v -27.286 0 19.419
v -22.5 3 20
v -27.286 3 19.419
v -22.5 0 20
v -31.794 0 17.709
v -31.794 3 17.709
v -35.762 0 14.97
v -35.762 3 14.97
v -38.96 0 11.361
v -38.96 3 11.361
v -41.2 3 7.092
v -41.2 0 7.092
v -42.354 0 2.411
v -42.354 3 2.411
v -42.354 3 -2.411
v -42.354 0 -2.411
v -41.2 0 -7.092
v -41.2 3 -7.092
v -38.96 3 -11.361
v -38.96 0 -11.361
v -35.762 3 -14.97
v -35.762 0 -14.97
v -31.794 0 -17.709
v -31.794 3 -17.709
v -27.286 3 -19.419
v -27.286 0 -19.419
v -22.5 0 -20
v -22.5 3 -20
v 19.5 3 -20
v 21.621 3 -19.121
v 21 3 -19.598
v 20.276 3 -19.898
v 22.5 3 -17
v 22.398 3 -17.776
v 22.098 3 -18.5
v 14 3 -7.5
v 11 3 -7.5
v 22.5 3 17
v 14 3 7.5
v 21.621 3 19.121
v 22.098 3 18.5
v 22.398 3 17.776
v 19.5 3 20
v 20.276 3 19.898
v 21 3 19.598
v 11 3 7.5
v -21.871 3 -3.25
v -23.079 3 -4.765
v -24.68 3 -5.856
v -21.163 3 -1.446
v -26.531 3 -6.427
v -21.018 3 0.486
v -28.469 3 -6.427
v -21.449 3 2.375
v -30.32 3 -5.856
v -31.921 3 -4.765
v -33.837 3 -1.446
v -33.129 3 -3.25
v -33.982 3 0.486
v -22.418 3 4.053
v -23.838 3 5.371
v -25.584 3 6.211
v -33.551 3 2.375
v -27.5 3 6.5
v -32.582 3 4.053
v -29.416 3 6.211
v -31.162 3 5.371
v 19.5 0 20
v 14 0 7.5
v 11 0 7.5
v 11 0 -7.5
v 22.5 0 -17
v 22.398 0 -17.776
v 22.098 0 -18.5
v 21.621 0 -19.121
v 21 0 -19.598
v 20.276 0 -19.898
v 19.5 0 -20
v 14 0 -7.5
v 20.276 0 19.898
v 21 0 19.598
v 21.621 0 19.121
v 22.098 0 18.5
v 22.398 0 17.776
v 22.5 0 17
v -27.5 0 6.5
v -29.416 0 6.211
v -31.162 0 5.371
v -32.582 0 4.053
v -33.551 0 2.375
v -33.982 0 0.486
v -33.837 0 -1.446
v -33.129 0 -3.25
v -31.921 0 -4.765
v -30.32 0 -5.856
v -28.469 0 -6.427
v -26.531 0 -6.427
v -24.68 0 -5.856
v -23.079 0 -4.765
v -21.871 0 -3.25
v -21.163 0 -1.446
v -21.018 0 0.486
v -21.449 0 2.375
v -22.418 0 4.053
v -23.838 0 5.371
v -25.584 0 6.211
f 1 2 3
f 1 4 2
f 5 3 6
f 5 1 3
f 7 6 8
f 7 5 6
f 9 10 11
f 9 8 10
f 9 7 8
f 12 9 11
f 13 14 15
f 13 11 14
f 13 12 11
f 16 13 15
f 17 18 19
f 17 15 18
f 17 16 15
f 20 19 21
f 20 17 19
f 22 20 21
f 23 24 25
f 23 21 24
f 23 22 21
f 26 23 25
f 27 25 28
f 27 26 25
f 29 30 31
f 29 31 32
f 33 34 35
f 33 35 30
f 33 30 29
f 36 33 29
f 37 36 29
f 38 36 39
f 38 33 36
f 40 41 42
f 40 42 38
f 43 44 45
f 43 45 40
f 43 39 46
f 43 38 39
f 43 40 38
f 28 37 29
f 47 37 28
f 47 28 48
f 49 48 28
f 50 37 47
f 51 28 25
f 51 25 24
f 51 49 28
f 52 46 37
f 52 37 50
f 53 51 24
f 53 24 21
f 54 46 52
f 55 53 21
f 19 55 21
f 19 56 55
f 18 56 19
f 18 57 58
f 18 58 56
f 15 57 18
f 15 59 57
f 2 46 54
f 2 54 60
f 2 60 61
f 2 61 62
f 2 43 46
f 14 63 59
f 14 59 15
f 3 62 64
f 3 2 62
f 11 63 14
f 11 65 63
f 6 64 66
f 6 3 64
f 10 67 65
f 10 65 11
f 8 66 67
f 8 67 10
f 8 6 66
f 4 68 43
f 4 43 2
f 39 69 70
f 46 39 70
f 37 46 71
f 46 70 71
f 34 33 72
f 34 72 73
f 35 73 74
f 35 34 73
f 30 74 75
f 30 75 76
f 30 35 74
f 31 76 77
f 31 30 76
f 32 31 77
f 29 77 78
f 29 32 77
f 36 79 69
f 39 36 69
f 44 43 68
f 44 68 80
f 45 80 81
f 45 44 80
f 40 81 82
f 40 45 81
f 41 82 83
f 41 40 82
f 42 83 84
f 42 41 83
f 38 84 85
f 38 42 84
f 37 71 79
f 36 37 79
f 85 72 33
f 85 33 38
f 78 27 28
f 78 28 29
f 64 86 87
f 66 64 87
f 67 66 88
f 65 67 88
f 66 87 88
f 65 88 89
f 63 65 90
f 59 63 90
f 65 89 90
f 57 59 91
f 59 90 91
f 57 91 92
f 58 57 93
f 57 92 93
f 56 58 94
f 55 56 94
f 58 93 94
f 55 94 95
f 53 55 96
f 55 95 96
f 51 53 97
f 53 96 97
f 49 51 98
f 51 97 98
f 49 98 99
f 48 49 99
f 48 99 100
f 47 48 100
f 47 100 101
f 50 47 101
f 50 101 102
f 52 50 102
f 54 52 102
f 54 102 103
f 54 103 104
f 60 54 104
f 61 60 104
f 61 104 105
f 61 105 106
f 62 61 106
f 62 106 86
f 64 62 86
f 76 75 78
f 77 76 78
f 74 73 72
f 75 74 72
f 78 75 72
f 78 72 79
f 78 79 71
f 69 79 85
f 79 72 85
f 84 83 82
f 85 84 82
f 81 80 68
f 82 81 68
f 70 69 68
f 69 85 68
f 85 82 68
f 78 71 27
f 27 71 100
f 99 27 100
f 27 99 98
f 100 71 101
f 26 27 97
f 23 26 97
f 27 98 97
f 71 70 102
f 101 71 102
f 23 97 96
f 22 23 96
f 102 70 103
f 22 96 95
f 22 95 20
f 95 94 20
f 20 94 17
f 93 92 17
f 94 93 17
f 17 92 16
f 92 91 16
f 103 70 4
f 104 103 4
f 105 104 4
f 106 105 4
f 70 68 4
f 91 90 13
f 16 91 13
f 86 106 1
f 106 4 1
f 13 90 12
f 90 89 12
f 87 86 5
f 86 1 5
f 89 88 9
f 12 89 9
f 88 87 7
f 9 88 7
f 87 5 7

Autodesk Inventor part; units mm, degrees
ref_plane "YZ Plane" through (0, 0, 0) normal (1, 0, 0) x (0, 1, 0)
ref_plane "XZ Plane" through (0, 0, 0) normal (0, 1, 0) x (-1, 0, 0)
ref_plane "XY Plane" through (0, 0, 0) normal (0, 0, 1) x (1, 0, 0)
sketch "Sketch1" plane through (0, 0, 0) normal (0, 1, 0) x (-1, 0, 0)
  line L0 (-22.5, 20) -> (22.5, 20)
  line L1 (22.5, 20) -> (22.5, -20)
  line L2 (22.5, -20) -> (-22.5, -20)
  line L3 (-22.5, -20) -> (-22.5, 20)
  line L4 (-22.5, 20) -> (22.5, -20) construction
  line L5 (22.5, 20) -> (-22.5, -20) construction
  arc A0 (22.5, -20) -> (22.5, 20) centre (22.5, 0) ccw
  point P0 (0, 0)
  dimension "d0" = 45
  dimension "d1" = 40
  dimension "d2" = 20
extrude "Extrusion1" add sketch "Sketch1" along normal blind 3
sketch "Sketch2" plane through (0, 3, 0) normal (0, 1, 0) x (1, 0, 0)
  arc A0 (-22.5, 20) -> (-22.5, -20) centre (-22.5, 0) ccw construction
  line L0 (-42.5, 0) -> (-27.5, 0) construction
  point P0 (0, 0)
  dimension "d5" = 15
hole "Hole1" at (-27.5, 3, 0) direction (0, -1, 0) diameter 13 end through all
sketch "Sketch4" plane through (0, 0, 0) normal (0, -1, 0) x (1, 0, 0)
  line L0 (22.5, 20) -> (22.5, -20) construction
  line L1 (22.5, 0) -> (12.5, 0) construction
  line L2 (11, -7.5) -> (14, -7.5)
  line L3 (14, -7.5) -> (14, 7.5)
  line L4 (14, 7.5) -> (11, 7.5)
  line L5 (11, 7.5) -> (11, -7.5)
  line L6 (11, -7.5) -> (14, 7.5) construction
  line L7 (14, -7.5) -> (11, 7.5) construction
  point P0 (0, 0)
  dimension "d17" = 10
  dimension "d18" = 3
  dimension "d19" = 15
extrude "Extrusion3" cut sketch "Sketch4" against normal blind 10
fillet "Fillet1" radius 3 2 edges at (22.5, 1.5, -20) (22.5, 1.5, 20)
properties part number "sample_mount"
